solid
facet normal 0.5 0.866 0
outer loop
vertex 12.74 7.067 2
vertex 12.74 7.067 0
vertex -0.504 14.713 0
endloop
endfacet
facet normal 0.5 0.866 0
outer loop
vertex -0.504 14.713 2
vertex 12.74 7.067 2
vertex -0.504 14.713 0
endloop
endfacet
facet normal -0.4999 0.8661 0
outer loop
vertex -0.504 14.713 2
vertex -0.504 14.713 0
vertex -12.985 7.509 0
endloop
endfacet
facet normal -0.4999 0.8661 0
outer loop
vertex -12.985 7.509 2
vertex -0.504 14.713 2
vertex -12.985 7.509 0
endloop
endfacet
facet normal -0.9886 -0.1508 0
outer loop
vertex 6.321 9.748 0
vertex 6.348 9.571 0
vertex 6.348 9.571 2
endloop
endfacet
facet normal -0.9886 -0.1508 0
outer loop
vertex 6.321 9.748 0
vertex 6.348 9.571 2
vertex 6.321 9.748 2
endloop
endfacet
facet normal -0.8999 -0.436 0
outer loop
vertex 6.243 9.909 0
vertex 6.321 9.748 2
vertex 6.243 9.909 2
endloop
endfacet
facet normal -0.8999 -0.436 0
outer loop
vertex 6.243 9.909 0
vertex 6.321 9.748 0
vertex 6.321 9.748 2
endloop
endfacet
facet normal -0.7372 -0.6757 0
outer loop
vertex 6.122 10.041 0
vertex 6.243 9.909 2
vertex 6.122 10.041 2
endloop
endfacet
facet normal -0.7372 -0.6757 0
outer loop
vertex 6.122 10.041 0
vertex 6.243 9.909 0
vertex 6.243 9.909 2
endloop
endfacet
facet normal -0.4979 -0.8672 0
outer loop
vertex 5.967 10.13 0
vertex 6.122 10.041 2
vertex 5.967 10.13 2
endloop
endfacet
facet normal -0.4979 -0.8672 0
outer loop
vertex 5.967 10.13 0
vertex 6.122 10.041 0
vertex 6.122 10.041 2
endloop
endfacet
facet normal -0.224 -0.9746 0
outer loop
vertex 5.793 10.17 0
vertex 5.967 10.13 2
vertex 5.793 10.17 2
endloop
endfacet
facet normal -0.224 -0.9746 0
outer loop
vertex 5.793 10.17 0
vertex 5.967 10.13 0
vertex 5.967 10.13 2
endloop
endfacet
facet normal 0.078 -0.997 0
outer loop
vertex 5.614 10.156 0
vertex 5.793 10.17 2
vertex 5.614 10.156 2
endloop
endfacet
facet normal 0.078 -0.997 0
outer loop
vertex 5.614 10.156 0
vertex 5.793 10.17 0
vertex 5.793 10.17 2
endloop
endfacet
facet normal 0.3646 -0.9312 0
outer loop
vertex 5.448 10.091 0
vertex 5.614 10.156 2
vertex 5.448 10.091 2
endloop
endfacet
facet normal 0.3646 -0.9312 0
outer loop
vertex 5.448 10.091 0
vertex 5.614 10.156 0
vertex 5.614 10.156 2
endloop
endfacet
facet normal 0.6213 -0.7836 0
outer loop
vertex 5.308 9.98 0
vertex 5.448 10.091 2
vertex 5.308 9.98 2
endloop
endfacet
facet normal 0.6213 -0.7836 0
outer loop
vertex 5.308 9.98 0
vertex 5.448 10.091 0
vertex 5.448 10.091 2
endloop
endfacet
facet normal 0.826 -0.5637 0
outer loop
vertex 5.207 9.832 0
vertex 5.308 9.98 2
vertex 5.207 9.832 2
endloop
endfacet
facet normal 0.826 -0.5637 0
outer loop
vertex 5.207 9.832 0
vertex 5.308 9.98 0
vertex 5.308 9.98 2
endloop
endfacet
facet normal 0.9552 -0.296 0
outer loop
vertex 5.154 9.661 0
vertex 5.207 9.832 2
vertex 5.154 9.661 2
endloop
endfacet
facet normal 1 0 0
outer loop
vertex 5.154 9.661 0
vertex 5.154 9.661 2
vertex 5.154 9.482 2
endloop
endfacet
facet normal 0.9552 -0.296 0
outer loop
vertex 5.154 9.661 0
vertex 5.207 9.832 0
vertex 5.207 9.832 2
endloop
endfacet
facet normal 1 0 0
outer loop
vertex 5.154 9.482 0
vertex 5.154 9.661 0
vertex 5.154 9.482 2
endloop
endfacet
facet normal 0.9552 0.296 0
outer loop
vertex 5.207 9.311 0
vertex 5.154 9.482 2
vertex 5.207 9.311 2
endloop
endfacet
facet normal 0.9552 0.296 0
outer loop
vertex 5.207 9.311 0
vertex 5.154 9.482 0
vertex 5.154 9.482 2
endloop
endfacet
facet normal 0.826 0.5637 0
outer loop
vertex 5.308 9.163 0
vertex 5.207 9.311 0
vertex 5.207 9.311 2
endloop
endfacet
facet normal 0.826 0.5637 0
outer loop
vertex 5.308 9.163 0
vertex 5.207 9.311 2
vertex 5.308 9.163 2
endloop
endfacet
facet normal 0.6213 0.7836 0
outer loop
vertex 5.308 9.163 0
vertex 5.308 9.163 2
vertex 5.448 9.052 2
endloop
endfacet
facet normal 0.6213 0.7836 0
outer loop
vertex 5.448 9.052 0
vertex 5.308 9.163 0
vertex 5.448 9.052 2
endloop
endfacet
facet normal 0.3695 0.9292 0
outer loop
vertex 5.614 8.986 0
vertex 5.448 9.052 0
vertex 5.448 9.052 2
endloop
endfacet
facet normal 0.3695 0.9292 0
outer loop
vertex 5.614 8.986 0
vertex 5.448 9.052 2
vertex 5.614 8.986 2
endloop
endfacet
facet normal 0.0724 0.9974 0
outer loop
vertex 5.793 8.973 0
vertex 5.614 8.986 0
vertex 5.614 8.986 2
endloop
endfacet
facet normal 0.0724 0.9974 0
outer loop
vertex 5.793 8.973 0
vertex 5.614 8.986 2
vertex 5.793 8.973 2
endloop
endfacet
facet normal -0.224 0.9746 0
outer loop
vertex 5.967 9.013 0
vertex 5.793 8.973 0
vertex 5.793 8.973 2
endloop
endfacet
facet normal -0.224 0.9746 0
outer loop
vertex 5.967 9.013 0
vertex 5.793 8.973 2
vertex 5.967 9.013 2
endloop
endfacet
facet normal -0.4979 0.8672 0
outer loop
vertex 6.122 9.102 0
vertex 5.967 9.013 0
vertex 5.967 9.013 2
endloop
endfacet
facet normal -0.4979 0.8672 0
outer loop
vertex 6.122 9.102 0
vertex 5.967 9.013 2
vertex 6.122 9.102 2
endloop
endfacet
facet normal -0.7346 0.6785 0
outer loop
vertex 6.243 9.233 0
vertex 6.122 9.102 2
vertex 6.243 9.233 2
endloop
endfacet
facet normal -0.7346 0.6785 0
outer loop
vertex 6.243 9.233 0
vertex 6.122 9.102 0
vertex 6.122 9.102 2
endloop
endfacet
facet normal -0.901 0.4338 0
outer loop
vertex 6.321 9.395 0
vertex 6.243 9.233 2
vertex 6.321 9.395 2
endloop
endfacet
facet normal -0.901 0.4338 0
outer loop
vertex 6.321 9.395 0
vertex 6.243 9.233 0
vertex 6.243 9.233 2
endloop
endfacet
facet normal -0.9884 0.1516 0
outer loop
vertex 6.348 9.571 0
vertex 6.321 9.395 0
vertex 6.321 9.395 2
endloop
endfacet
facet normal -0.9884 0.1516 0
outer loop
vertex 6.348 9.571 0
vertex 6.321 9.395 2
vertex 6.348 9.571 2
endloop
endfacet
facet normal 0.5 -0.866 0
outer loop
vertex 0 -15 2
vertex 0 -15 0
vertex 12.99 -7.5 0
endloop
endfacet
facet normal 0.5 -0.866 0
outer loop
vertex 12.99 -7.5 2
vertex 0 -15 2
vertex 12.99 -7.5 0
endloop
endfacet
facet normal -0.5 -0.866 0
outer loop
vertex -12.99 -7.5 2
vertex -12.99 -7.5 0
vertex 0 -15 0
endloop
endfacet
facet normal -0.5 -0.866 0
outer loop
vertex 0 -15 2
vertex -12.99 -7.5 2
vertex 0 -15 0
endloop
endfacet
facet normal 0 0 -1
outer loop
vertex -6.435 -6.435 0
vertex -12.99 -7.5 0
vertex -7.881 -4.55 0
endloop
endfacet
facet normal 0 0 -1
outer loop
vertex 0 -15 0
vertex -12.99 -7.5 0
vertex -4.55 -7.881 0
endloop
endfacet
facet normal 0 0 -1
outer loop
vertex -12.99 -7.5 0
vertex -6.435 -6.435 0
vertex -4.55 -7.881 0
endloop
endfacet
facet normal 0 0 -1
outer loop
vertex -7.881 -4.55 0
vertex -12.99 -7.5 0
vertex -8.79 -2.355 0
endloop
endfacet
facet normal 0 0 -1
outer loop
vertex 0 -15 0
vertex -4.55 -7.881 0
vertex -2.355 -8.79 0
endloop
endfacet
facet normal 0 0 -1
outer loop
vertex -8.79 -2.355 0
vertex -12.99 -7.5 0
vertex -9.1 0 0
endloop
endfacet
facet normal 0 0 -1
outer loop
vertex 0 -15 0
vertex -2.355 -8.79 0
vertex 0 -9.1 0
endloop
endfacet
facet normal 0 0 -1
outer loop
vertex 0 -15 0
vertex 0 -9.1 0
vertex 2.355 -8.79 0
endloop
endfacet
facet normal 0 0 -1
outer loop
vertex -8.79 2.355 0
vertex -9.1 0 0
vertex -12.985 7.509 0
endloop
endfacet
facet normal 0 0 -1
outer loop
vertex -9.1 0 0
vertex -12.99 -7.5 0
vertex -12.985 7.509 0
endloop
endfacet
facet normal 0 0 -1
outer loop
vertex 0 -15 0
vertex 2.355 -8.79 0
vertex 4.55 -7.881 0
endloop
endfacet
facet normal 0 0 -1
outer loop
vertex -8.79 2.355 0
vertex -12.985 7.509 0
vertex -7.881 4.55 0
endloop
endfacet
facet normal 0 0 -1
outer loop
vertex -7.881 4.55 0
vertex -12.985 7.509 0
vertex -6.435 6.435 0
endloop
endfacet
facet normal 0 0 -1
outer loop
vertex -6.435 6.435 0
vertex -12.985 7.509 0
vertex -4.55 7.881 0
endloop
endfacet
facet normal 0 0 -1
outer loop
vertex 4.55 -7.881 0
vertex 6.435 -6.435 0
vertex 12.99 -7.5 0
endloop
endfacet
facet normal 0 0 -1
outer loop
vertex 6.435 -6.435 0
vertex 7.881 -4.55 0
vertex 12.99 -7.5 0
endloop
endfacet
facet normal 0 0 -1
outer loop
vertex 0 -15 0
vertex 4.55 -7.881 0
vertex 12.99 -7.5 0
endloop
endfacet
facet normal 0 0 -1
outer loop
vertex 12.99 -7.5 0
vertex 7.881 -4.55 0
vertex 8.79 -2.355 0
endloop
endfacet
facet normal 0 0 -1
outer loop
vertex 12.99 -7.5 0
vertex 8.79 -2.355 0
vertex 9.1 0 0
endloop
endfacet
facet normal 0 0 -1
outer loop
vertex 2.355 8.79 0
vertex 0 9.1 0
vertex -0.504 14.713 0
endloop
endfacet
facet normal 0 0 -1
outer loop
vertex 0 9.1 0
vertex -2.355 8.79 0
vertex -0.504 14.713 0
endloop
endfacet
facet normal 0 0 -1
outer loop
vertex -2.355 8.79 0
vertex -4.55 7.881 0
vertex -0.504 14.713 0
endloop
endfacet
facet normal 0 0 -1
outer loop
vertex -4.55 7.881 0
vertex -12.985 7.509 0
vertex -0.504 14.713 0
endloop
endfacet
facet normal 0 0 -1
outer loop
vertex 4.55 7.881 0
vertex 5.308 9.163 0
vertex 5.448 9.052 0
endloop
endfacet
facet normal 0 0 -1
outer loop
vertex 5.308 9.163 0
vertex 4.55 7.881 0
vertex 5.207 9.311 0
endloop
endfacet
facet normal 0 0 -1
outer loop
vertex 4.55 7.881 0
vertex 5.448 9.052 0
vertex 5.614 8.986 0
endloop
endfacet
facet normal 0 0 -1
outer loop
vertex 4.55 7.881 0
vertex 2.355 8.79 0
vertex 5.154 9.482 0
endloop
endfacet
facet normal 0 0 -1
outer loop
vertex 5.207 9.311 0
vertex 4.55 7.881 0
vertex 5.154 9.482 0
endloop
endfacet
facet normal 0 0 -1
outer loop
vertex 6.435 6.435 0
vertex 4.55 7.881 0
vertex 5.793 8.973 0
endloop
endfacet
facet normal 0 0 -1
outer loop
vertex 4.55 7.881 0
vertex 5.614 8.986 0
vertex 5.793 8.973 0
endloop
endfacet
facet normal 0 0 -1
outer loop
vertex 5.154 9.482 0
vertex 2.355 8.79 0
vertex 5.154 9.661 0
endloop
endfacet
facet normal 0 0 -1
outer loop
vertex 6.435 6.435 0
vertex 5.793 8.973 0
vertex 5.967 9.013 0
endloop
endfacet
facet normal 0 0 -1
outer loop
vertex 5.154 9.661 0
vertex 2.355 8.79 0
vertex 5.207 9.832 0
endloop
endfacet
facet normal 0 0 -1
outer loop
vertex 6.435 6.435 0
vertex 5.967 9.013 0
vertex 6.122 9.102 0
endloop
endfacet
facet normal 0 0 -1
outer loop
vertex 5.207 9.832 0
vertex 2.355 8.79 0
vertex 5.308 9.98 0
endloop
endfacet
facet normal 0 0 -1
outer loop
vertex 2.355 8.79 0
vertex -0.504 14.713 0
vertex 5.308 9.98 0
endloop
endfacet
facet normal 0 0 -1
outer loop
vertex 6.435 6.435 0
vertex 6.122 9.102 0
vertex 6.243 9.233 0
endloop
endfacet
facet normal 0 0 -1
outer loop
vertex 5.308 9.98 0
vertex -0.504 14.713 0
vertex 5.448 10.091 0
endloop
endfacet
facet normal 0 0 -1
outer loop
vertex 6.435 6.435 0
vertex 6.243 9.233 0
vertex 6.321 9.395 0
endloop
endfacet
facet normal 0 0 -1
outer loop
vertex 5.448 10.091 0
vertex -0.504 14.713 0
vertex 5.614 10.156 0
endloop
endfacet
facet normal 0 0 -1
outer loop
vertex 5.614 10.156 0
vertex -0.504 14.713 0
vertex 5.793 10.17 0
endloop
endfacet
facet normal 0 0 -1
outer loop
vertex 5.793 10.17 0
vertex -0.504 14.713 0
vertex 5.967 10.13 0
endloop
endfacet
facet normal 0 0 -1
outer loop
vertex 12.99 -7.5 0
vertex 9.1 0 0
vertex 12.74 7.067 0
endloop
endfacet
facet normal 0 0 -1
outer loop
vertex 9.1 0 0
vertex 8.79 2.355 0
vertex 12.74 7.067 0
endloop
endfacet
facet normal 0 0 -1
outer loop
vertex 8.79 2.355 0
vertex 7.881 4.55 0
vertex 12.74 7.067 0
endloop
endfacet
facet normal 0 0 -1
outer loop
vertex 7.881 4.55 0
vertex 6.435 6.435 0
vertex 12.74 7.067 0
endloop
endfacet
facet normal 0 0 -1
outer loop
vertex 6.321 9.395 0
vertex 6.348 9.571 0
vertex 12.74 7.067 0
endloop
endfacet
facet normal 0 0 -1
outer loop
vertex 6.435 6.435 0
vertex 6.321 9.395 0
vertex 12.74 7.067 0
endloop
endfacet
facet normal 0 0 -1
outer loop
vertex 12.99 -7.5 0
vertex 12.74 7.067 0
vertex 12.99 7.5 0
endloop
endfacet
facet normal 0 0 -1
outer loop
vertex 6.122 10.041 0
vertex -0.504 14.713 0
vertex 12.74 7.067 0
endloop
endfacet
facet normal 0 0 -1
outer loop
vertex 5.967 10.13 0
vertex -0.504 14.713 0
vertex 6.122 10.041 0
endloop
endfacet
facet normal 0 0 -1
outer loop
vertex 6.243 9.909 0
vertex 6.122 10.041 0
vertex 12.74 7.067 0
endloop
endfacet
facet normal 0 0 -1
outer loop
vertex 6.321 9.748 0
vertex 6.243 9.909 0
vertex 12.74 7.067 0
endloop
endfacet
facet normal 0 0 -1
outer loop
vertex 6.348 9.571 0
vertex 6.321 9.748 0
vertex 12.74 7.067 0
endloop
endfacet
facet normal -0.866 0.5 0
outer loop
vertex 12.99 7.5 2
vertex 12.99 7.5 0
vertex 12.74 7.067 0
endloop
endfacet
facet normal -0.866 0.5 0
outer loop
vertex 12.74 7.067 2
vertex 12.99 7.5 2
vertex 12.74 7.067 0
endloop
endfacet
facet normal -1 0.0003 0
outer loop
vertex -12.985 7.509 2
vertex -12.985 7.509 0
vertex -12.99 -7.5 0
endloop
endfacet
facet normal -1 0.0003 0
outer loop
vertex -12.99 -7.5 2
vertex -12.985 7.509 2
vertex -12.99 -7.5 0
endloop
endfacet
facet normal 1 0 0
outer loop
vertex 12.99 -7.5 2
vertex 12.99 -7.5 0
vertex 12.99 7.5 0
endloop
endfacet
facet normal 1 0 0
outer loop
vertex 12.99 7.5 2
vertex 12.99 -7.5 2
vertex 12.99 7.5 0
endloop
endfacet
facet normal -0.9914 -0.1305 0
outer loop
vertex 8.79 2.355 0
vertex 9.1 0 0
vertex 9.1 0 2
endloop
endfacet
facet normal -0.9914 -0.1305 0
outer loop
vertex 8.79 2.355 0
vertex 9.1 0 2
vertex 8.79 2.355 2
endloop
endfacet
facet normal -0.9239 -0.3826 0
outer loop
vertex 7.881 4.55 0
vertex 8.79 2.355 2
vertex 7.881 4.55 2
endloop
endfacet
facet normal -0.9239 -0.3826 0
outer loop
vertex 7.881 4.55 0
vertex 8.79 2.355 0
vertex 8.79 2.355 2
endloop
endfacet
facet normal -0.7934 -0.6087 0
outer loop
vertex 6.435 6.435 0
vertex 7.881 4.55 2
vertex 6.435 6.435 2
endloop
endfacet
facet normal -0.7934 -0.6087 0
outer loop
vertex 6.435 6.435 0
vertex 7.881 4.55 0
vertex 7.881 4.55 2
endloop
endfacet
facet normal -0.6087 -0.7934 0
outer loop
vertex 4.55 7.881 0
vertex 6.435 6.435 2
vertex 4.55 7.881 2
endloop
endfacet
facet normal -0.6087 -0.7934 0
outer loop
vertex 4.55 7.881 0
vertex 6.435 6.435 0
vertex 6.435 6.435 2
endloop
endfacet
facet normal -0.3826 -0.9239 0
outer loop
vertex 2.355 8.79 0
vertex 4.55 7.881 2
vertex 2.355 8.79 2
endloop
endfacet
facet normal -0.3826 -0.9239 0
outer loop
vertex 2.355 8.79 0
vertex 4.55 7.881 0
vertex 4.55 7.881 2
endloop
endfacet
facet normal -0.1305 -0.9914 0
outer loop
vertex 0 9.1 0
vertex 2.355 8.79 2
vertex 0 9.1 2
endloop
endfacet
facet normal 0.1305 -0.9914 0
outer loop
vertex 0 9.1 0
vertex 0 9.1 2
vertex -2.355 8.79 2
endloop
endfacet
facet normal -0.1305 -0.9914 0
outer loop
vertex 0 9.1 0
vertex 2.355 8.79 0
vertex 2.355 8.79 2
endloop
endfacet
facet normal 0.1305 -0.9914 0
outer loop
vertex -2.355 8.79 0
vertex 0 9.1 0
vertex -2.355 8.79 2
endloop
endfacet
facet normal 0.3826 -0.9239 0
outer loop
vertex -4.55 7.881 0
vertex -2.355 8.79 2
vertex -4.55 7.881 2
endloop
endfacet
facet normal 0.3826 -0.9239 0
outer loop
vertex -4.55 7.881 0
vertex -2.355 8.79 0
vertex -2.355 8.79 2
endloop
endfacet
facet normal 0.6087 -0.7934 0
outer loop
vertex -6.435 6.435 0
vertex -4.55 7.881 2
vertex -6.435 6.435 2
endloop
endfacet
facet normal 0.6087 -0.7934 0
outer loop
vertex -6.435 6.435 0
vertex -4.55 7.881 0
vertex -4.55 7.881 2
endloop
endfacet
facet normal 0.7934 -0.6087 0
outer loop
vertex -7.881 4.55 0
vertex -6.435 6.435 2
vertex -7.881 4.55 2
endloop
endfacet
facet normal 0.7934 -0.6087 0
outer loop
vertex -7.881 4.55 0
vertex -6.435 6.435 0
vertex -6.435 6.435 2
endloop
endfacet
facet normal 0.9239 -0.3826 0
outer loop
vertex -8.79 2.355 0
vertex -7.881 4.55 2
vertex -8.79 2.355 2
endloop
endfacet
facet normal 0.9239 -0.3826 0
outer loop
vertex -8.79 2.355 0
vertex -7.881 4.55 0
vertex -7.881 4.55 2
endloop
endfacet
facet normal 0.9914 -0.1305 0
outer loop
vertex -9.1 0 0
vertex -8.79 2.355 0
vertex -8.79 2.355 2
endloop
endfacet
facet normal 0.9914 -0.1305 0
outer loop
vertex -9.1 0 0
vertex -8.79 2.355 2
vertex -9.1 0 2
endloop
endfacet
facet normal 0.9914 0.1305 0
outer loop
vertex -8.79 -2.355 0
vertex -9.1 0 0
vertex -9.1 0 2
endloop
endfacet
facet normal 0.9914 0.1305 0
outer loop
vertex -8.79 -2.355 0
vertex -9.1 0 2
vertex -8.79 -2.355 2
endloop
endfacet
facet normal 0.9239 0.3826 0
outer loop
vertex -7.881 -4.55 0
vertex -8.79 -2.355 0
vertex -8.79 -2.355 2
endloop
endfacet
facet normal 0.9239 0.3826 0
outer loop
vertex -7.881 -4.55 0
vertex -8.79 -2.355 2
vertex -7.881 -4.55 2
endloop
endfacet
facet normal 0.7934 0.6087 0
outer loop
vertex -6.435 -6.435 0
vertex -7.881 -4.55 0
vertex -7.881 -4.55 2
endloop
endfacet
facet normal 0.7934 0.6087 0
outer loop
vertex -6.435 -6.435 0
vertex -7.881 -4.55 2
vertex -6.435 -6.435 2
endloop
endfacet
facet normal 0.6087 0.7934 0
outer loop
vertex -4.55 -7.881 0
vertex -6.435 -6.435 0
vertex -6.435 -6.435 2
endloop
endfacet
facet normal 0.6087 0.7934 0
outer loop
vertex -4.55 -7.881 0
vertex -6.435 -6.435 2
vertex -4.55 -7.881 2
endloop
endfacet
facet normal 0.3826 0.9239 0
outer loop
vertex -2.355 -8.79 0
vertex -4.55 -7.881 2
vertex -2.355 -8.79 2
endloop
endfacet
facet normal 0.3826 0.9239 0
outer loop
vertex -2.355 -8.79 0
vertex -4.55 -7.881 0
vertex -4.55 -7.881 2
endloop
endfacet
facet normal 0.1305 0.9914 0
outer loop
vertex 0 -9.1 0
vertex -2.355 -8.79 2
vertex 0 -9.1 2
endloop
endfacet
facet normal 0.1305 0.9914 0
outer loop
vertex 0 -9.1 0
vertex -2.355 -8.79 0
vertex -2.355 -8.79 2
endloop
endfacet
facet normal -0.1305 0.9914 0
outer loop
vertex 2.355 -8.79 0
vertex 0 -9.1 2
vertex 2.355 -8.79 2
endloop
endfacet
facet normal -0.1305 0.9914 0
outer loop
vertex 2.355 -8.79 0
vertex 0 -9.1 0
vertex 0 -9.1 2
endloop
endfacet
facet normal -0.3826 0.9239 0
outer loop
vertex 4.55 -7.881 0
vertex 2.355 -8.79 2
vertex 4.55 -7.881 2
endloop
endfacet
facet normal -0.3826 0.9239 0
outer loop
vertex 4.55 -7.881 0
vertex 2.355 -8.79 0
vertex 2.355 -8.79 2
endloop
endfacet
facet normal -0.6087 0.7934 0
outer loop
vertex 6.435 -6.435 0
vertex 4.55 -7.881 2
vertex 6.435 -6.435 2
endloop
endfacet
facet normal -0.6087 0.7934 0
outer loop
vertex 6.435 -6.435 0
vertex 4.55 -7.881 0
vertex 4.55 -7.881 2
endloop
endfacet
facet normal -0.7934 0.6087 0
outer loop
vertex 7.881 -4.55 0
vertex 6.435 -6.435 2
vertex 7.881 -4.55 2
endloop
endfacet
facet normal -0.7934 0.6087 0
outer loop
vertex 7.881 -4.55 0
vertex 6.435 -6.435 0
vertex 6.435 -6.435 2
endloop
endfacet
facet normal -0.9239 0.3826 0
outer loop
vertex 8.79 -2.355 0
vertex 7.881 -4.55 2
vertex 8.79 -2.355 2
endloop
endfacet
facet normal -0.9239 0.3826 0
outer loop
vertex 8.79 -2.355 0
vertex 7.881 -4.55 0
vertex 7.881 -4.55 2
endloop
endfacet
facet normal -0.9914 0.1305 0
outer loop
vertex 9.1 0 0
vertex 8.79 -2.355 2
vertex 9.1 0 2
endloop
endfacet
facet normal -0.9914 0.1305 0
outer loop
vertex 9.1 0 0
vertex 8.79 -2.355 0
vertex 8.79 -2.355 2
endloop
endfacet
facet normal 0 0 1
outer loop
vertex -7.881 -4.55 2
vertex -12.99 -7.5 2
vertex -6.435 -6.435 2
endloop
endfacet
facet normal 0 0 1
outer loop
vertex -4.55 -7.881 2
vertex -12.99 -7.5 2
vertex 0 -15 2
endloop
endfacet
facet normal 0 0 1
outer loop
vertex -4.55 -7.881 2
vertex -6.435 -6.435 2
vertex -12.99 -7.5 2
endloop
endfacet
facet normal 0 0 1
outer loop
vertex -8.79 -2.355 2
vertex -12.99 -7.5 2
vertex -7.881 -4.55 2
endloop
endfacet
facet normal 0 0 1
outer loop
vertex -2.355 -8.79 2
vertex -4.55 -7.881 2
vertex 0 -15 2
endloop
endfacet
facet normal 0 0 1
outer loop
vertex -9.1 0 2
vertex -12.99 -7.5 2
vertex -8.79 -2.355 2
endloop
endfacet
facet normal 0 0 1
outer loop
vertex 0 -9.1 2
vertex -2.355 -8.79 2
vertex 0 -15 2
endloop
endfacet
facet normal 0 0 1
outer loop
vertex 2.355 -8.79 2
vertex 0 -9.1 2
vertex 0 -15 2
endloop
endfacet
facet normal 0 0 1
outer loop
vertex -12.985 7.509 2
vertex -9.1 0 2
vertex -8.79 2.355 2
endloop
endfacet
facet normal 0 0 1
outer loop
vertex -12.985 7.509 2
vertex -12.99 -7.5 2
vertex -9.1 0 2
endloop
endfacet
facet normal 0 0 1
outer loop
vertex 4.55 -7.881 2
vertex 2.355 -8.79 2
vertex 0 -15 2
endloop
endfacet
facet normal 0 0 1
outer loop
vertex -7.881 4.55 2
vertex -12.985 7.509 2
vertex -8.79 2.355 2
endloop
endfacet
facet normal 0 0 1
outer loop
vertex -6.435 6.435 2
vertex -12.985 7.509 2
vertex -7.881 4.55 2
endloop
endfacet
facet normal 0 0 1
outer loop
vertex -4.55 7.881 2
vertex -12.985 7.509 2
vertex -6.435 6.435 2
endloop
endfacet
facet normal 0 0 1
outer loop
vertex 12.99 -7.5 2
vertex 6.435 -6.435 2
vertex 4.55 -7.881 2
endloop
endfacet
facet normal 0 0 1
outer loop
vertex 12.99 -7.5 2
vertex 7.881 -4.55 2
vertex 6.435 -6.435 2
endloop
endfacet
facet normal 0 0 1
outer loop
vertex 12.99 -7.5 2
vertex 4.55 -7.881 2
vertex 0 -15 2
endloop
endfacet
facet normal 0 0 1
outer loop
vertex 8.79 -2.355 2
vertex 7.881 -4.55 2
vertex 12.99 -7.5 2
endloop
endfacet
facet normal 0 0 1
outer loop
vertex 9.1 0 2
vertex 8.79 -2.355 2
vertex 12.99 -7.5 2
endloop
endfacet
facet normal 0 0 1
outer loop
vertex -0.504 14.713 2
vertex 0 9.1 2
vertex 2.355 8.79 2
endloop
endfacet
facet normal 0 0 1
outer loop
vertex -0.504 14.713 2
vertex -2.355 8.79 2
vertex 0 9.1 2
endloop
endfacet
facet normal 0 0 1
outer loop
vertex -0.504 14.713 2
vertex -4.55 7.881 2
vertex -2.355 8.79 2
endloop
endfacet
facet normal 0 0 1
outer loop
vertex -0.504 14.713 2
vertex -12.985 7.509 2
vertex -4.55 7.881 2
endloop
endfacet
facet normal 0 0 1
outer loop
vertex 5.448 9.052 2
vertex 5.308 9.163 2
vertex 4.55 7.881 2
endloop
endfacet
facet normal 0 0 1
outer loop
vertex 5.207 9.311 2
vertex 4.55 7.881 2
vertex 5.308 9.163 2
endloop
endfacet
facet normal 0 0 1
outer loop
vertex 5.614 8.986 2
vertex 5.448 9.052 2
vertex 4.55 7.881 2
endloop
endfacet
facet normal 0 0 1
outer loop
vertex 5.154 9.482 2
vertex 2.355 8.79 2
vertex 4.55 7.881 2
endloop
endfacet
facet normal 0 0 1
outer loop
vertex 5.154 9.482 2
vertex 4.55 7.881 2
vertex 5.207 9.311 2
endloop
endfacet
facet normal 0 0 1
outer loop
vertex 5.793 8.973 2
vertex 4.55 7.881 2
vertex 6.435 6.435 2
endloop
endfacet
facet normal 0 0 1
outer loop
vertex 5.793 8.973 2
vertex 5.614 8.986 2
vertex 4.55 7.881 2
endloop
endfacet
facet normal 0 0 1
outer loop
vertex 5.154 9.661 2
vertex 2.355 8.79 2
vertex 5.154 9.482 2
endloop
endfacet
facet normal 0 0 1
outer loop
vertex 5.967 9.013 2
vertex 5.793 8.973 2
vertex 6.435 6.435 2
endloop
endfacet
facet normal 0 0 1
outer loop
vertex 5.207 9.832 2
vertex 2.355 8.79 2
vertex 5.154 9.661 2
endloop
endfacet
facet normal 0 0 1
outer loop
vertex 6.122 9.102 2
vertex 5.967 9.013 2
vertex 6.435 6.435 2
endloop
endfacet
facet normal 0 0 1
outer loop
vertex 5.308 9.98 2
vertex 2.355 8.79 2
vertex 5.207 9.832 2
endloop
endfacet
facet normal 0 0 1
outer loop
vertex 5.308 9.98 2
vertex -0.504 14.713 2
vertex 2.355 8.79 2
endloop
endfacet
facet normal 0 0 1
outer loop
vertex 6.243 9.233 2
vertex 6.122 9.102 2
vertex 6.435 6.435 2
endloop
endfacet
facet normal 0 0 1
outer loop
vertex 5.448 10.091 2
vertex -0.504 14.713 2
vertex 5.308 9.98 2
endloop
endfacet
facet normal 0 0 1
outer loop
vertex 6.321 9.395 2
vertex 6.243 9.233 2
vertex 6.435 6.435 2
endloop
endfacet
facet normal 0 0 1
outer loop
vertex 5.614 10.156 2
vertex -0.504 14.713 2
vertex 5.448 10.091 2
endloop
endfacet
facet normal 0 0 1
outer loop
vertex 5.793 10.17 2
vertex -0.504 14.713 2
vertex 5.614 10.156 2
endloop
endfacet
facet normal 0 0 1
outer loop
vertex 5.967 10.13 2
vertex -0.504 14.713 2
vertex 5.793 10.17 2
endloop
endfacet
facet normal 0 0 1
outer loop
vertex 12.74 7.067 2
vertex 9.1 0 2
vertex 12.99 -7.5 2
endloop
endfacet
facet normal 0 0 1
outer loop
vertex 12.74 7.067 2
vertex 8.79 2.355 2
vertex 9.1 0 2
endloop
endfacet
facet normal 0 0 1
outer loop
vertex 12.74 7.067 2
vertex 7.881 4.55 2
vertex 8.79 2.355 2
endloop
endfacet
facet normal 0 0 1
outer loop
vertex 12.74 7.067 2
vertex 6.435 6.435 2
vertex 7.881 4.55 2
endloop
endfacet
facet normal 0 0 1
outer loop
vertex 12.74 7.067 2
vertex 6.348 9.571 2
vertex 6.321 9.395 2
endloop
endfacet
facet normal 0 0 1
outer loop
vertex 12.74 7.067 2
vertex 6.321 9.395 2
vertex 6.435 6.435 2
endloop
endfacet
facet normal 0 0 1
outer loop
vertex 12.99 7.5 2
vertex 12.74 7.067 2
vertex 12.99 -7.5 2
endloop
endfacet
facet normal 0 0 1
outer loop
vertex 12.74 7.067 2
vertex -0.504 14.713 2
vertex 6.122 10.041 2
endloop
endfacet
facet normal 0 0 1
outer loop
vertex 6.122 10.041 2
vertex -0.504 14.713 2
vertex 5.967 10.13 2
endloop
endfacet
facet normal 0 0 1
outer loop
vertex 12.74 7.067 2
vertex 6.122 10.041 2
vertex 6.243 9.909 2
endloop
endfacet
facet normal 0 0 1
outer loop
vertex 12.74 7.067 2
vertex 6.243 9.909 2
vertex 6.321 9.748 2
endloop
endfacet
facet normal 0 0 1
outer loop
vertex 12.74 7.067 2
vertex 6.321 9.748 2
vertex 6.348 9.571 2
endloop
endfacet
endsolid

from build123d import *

# Parameters (mm, degrees)
SKETCH_R   = 9.1
SKETCH_R_2 = 0.6
PAD_DEPTH  = 2


with BuildPart() as part:
    # Sketch → Pad (new body)
    with BuildSketch(Plane.XY):
        Polygon((-0.50397, 14.713397), (-12.984903, 7.508821), (-12.99, -7.5), (0, -14.99967), (12.99, -7.5), (12.99, 7.5), (12.74, 7.066987), align=None)
        Circle(SKETCH_R, mode=Mode.SUBTRACT)
        with Locations((5.747722, 9.571406)):
            Circle(SKETCH_R_2, mode=Mode.SUBTRACT)
    extrude(amount=PAD_DEPTH)


solid = part.part
